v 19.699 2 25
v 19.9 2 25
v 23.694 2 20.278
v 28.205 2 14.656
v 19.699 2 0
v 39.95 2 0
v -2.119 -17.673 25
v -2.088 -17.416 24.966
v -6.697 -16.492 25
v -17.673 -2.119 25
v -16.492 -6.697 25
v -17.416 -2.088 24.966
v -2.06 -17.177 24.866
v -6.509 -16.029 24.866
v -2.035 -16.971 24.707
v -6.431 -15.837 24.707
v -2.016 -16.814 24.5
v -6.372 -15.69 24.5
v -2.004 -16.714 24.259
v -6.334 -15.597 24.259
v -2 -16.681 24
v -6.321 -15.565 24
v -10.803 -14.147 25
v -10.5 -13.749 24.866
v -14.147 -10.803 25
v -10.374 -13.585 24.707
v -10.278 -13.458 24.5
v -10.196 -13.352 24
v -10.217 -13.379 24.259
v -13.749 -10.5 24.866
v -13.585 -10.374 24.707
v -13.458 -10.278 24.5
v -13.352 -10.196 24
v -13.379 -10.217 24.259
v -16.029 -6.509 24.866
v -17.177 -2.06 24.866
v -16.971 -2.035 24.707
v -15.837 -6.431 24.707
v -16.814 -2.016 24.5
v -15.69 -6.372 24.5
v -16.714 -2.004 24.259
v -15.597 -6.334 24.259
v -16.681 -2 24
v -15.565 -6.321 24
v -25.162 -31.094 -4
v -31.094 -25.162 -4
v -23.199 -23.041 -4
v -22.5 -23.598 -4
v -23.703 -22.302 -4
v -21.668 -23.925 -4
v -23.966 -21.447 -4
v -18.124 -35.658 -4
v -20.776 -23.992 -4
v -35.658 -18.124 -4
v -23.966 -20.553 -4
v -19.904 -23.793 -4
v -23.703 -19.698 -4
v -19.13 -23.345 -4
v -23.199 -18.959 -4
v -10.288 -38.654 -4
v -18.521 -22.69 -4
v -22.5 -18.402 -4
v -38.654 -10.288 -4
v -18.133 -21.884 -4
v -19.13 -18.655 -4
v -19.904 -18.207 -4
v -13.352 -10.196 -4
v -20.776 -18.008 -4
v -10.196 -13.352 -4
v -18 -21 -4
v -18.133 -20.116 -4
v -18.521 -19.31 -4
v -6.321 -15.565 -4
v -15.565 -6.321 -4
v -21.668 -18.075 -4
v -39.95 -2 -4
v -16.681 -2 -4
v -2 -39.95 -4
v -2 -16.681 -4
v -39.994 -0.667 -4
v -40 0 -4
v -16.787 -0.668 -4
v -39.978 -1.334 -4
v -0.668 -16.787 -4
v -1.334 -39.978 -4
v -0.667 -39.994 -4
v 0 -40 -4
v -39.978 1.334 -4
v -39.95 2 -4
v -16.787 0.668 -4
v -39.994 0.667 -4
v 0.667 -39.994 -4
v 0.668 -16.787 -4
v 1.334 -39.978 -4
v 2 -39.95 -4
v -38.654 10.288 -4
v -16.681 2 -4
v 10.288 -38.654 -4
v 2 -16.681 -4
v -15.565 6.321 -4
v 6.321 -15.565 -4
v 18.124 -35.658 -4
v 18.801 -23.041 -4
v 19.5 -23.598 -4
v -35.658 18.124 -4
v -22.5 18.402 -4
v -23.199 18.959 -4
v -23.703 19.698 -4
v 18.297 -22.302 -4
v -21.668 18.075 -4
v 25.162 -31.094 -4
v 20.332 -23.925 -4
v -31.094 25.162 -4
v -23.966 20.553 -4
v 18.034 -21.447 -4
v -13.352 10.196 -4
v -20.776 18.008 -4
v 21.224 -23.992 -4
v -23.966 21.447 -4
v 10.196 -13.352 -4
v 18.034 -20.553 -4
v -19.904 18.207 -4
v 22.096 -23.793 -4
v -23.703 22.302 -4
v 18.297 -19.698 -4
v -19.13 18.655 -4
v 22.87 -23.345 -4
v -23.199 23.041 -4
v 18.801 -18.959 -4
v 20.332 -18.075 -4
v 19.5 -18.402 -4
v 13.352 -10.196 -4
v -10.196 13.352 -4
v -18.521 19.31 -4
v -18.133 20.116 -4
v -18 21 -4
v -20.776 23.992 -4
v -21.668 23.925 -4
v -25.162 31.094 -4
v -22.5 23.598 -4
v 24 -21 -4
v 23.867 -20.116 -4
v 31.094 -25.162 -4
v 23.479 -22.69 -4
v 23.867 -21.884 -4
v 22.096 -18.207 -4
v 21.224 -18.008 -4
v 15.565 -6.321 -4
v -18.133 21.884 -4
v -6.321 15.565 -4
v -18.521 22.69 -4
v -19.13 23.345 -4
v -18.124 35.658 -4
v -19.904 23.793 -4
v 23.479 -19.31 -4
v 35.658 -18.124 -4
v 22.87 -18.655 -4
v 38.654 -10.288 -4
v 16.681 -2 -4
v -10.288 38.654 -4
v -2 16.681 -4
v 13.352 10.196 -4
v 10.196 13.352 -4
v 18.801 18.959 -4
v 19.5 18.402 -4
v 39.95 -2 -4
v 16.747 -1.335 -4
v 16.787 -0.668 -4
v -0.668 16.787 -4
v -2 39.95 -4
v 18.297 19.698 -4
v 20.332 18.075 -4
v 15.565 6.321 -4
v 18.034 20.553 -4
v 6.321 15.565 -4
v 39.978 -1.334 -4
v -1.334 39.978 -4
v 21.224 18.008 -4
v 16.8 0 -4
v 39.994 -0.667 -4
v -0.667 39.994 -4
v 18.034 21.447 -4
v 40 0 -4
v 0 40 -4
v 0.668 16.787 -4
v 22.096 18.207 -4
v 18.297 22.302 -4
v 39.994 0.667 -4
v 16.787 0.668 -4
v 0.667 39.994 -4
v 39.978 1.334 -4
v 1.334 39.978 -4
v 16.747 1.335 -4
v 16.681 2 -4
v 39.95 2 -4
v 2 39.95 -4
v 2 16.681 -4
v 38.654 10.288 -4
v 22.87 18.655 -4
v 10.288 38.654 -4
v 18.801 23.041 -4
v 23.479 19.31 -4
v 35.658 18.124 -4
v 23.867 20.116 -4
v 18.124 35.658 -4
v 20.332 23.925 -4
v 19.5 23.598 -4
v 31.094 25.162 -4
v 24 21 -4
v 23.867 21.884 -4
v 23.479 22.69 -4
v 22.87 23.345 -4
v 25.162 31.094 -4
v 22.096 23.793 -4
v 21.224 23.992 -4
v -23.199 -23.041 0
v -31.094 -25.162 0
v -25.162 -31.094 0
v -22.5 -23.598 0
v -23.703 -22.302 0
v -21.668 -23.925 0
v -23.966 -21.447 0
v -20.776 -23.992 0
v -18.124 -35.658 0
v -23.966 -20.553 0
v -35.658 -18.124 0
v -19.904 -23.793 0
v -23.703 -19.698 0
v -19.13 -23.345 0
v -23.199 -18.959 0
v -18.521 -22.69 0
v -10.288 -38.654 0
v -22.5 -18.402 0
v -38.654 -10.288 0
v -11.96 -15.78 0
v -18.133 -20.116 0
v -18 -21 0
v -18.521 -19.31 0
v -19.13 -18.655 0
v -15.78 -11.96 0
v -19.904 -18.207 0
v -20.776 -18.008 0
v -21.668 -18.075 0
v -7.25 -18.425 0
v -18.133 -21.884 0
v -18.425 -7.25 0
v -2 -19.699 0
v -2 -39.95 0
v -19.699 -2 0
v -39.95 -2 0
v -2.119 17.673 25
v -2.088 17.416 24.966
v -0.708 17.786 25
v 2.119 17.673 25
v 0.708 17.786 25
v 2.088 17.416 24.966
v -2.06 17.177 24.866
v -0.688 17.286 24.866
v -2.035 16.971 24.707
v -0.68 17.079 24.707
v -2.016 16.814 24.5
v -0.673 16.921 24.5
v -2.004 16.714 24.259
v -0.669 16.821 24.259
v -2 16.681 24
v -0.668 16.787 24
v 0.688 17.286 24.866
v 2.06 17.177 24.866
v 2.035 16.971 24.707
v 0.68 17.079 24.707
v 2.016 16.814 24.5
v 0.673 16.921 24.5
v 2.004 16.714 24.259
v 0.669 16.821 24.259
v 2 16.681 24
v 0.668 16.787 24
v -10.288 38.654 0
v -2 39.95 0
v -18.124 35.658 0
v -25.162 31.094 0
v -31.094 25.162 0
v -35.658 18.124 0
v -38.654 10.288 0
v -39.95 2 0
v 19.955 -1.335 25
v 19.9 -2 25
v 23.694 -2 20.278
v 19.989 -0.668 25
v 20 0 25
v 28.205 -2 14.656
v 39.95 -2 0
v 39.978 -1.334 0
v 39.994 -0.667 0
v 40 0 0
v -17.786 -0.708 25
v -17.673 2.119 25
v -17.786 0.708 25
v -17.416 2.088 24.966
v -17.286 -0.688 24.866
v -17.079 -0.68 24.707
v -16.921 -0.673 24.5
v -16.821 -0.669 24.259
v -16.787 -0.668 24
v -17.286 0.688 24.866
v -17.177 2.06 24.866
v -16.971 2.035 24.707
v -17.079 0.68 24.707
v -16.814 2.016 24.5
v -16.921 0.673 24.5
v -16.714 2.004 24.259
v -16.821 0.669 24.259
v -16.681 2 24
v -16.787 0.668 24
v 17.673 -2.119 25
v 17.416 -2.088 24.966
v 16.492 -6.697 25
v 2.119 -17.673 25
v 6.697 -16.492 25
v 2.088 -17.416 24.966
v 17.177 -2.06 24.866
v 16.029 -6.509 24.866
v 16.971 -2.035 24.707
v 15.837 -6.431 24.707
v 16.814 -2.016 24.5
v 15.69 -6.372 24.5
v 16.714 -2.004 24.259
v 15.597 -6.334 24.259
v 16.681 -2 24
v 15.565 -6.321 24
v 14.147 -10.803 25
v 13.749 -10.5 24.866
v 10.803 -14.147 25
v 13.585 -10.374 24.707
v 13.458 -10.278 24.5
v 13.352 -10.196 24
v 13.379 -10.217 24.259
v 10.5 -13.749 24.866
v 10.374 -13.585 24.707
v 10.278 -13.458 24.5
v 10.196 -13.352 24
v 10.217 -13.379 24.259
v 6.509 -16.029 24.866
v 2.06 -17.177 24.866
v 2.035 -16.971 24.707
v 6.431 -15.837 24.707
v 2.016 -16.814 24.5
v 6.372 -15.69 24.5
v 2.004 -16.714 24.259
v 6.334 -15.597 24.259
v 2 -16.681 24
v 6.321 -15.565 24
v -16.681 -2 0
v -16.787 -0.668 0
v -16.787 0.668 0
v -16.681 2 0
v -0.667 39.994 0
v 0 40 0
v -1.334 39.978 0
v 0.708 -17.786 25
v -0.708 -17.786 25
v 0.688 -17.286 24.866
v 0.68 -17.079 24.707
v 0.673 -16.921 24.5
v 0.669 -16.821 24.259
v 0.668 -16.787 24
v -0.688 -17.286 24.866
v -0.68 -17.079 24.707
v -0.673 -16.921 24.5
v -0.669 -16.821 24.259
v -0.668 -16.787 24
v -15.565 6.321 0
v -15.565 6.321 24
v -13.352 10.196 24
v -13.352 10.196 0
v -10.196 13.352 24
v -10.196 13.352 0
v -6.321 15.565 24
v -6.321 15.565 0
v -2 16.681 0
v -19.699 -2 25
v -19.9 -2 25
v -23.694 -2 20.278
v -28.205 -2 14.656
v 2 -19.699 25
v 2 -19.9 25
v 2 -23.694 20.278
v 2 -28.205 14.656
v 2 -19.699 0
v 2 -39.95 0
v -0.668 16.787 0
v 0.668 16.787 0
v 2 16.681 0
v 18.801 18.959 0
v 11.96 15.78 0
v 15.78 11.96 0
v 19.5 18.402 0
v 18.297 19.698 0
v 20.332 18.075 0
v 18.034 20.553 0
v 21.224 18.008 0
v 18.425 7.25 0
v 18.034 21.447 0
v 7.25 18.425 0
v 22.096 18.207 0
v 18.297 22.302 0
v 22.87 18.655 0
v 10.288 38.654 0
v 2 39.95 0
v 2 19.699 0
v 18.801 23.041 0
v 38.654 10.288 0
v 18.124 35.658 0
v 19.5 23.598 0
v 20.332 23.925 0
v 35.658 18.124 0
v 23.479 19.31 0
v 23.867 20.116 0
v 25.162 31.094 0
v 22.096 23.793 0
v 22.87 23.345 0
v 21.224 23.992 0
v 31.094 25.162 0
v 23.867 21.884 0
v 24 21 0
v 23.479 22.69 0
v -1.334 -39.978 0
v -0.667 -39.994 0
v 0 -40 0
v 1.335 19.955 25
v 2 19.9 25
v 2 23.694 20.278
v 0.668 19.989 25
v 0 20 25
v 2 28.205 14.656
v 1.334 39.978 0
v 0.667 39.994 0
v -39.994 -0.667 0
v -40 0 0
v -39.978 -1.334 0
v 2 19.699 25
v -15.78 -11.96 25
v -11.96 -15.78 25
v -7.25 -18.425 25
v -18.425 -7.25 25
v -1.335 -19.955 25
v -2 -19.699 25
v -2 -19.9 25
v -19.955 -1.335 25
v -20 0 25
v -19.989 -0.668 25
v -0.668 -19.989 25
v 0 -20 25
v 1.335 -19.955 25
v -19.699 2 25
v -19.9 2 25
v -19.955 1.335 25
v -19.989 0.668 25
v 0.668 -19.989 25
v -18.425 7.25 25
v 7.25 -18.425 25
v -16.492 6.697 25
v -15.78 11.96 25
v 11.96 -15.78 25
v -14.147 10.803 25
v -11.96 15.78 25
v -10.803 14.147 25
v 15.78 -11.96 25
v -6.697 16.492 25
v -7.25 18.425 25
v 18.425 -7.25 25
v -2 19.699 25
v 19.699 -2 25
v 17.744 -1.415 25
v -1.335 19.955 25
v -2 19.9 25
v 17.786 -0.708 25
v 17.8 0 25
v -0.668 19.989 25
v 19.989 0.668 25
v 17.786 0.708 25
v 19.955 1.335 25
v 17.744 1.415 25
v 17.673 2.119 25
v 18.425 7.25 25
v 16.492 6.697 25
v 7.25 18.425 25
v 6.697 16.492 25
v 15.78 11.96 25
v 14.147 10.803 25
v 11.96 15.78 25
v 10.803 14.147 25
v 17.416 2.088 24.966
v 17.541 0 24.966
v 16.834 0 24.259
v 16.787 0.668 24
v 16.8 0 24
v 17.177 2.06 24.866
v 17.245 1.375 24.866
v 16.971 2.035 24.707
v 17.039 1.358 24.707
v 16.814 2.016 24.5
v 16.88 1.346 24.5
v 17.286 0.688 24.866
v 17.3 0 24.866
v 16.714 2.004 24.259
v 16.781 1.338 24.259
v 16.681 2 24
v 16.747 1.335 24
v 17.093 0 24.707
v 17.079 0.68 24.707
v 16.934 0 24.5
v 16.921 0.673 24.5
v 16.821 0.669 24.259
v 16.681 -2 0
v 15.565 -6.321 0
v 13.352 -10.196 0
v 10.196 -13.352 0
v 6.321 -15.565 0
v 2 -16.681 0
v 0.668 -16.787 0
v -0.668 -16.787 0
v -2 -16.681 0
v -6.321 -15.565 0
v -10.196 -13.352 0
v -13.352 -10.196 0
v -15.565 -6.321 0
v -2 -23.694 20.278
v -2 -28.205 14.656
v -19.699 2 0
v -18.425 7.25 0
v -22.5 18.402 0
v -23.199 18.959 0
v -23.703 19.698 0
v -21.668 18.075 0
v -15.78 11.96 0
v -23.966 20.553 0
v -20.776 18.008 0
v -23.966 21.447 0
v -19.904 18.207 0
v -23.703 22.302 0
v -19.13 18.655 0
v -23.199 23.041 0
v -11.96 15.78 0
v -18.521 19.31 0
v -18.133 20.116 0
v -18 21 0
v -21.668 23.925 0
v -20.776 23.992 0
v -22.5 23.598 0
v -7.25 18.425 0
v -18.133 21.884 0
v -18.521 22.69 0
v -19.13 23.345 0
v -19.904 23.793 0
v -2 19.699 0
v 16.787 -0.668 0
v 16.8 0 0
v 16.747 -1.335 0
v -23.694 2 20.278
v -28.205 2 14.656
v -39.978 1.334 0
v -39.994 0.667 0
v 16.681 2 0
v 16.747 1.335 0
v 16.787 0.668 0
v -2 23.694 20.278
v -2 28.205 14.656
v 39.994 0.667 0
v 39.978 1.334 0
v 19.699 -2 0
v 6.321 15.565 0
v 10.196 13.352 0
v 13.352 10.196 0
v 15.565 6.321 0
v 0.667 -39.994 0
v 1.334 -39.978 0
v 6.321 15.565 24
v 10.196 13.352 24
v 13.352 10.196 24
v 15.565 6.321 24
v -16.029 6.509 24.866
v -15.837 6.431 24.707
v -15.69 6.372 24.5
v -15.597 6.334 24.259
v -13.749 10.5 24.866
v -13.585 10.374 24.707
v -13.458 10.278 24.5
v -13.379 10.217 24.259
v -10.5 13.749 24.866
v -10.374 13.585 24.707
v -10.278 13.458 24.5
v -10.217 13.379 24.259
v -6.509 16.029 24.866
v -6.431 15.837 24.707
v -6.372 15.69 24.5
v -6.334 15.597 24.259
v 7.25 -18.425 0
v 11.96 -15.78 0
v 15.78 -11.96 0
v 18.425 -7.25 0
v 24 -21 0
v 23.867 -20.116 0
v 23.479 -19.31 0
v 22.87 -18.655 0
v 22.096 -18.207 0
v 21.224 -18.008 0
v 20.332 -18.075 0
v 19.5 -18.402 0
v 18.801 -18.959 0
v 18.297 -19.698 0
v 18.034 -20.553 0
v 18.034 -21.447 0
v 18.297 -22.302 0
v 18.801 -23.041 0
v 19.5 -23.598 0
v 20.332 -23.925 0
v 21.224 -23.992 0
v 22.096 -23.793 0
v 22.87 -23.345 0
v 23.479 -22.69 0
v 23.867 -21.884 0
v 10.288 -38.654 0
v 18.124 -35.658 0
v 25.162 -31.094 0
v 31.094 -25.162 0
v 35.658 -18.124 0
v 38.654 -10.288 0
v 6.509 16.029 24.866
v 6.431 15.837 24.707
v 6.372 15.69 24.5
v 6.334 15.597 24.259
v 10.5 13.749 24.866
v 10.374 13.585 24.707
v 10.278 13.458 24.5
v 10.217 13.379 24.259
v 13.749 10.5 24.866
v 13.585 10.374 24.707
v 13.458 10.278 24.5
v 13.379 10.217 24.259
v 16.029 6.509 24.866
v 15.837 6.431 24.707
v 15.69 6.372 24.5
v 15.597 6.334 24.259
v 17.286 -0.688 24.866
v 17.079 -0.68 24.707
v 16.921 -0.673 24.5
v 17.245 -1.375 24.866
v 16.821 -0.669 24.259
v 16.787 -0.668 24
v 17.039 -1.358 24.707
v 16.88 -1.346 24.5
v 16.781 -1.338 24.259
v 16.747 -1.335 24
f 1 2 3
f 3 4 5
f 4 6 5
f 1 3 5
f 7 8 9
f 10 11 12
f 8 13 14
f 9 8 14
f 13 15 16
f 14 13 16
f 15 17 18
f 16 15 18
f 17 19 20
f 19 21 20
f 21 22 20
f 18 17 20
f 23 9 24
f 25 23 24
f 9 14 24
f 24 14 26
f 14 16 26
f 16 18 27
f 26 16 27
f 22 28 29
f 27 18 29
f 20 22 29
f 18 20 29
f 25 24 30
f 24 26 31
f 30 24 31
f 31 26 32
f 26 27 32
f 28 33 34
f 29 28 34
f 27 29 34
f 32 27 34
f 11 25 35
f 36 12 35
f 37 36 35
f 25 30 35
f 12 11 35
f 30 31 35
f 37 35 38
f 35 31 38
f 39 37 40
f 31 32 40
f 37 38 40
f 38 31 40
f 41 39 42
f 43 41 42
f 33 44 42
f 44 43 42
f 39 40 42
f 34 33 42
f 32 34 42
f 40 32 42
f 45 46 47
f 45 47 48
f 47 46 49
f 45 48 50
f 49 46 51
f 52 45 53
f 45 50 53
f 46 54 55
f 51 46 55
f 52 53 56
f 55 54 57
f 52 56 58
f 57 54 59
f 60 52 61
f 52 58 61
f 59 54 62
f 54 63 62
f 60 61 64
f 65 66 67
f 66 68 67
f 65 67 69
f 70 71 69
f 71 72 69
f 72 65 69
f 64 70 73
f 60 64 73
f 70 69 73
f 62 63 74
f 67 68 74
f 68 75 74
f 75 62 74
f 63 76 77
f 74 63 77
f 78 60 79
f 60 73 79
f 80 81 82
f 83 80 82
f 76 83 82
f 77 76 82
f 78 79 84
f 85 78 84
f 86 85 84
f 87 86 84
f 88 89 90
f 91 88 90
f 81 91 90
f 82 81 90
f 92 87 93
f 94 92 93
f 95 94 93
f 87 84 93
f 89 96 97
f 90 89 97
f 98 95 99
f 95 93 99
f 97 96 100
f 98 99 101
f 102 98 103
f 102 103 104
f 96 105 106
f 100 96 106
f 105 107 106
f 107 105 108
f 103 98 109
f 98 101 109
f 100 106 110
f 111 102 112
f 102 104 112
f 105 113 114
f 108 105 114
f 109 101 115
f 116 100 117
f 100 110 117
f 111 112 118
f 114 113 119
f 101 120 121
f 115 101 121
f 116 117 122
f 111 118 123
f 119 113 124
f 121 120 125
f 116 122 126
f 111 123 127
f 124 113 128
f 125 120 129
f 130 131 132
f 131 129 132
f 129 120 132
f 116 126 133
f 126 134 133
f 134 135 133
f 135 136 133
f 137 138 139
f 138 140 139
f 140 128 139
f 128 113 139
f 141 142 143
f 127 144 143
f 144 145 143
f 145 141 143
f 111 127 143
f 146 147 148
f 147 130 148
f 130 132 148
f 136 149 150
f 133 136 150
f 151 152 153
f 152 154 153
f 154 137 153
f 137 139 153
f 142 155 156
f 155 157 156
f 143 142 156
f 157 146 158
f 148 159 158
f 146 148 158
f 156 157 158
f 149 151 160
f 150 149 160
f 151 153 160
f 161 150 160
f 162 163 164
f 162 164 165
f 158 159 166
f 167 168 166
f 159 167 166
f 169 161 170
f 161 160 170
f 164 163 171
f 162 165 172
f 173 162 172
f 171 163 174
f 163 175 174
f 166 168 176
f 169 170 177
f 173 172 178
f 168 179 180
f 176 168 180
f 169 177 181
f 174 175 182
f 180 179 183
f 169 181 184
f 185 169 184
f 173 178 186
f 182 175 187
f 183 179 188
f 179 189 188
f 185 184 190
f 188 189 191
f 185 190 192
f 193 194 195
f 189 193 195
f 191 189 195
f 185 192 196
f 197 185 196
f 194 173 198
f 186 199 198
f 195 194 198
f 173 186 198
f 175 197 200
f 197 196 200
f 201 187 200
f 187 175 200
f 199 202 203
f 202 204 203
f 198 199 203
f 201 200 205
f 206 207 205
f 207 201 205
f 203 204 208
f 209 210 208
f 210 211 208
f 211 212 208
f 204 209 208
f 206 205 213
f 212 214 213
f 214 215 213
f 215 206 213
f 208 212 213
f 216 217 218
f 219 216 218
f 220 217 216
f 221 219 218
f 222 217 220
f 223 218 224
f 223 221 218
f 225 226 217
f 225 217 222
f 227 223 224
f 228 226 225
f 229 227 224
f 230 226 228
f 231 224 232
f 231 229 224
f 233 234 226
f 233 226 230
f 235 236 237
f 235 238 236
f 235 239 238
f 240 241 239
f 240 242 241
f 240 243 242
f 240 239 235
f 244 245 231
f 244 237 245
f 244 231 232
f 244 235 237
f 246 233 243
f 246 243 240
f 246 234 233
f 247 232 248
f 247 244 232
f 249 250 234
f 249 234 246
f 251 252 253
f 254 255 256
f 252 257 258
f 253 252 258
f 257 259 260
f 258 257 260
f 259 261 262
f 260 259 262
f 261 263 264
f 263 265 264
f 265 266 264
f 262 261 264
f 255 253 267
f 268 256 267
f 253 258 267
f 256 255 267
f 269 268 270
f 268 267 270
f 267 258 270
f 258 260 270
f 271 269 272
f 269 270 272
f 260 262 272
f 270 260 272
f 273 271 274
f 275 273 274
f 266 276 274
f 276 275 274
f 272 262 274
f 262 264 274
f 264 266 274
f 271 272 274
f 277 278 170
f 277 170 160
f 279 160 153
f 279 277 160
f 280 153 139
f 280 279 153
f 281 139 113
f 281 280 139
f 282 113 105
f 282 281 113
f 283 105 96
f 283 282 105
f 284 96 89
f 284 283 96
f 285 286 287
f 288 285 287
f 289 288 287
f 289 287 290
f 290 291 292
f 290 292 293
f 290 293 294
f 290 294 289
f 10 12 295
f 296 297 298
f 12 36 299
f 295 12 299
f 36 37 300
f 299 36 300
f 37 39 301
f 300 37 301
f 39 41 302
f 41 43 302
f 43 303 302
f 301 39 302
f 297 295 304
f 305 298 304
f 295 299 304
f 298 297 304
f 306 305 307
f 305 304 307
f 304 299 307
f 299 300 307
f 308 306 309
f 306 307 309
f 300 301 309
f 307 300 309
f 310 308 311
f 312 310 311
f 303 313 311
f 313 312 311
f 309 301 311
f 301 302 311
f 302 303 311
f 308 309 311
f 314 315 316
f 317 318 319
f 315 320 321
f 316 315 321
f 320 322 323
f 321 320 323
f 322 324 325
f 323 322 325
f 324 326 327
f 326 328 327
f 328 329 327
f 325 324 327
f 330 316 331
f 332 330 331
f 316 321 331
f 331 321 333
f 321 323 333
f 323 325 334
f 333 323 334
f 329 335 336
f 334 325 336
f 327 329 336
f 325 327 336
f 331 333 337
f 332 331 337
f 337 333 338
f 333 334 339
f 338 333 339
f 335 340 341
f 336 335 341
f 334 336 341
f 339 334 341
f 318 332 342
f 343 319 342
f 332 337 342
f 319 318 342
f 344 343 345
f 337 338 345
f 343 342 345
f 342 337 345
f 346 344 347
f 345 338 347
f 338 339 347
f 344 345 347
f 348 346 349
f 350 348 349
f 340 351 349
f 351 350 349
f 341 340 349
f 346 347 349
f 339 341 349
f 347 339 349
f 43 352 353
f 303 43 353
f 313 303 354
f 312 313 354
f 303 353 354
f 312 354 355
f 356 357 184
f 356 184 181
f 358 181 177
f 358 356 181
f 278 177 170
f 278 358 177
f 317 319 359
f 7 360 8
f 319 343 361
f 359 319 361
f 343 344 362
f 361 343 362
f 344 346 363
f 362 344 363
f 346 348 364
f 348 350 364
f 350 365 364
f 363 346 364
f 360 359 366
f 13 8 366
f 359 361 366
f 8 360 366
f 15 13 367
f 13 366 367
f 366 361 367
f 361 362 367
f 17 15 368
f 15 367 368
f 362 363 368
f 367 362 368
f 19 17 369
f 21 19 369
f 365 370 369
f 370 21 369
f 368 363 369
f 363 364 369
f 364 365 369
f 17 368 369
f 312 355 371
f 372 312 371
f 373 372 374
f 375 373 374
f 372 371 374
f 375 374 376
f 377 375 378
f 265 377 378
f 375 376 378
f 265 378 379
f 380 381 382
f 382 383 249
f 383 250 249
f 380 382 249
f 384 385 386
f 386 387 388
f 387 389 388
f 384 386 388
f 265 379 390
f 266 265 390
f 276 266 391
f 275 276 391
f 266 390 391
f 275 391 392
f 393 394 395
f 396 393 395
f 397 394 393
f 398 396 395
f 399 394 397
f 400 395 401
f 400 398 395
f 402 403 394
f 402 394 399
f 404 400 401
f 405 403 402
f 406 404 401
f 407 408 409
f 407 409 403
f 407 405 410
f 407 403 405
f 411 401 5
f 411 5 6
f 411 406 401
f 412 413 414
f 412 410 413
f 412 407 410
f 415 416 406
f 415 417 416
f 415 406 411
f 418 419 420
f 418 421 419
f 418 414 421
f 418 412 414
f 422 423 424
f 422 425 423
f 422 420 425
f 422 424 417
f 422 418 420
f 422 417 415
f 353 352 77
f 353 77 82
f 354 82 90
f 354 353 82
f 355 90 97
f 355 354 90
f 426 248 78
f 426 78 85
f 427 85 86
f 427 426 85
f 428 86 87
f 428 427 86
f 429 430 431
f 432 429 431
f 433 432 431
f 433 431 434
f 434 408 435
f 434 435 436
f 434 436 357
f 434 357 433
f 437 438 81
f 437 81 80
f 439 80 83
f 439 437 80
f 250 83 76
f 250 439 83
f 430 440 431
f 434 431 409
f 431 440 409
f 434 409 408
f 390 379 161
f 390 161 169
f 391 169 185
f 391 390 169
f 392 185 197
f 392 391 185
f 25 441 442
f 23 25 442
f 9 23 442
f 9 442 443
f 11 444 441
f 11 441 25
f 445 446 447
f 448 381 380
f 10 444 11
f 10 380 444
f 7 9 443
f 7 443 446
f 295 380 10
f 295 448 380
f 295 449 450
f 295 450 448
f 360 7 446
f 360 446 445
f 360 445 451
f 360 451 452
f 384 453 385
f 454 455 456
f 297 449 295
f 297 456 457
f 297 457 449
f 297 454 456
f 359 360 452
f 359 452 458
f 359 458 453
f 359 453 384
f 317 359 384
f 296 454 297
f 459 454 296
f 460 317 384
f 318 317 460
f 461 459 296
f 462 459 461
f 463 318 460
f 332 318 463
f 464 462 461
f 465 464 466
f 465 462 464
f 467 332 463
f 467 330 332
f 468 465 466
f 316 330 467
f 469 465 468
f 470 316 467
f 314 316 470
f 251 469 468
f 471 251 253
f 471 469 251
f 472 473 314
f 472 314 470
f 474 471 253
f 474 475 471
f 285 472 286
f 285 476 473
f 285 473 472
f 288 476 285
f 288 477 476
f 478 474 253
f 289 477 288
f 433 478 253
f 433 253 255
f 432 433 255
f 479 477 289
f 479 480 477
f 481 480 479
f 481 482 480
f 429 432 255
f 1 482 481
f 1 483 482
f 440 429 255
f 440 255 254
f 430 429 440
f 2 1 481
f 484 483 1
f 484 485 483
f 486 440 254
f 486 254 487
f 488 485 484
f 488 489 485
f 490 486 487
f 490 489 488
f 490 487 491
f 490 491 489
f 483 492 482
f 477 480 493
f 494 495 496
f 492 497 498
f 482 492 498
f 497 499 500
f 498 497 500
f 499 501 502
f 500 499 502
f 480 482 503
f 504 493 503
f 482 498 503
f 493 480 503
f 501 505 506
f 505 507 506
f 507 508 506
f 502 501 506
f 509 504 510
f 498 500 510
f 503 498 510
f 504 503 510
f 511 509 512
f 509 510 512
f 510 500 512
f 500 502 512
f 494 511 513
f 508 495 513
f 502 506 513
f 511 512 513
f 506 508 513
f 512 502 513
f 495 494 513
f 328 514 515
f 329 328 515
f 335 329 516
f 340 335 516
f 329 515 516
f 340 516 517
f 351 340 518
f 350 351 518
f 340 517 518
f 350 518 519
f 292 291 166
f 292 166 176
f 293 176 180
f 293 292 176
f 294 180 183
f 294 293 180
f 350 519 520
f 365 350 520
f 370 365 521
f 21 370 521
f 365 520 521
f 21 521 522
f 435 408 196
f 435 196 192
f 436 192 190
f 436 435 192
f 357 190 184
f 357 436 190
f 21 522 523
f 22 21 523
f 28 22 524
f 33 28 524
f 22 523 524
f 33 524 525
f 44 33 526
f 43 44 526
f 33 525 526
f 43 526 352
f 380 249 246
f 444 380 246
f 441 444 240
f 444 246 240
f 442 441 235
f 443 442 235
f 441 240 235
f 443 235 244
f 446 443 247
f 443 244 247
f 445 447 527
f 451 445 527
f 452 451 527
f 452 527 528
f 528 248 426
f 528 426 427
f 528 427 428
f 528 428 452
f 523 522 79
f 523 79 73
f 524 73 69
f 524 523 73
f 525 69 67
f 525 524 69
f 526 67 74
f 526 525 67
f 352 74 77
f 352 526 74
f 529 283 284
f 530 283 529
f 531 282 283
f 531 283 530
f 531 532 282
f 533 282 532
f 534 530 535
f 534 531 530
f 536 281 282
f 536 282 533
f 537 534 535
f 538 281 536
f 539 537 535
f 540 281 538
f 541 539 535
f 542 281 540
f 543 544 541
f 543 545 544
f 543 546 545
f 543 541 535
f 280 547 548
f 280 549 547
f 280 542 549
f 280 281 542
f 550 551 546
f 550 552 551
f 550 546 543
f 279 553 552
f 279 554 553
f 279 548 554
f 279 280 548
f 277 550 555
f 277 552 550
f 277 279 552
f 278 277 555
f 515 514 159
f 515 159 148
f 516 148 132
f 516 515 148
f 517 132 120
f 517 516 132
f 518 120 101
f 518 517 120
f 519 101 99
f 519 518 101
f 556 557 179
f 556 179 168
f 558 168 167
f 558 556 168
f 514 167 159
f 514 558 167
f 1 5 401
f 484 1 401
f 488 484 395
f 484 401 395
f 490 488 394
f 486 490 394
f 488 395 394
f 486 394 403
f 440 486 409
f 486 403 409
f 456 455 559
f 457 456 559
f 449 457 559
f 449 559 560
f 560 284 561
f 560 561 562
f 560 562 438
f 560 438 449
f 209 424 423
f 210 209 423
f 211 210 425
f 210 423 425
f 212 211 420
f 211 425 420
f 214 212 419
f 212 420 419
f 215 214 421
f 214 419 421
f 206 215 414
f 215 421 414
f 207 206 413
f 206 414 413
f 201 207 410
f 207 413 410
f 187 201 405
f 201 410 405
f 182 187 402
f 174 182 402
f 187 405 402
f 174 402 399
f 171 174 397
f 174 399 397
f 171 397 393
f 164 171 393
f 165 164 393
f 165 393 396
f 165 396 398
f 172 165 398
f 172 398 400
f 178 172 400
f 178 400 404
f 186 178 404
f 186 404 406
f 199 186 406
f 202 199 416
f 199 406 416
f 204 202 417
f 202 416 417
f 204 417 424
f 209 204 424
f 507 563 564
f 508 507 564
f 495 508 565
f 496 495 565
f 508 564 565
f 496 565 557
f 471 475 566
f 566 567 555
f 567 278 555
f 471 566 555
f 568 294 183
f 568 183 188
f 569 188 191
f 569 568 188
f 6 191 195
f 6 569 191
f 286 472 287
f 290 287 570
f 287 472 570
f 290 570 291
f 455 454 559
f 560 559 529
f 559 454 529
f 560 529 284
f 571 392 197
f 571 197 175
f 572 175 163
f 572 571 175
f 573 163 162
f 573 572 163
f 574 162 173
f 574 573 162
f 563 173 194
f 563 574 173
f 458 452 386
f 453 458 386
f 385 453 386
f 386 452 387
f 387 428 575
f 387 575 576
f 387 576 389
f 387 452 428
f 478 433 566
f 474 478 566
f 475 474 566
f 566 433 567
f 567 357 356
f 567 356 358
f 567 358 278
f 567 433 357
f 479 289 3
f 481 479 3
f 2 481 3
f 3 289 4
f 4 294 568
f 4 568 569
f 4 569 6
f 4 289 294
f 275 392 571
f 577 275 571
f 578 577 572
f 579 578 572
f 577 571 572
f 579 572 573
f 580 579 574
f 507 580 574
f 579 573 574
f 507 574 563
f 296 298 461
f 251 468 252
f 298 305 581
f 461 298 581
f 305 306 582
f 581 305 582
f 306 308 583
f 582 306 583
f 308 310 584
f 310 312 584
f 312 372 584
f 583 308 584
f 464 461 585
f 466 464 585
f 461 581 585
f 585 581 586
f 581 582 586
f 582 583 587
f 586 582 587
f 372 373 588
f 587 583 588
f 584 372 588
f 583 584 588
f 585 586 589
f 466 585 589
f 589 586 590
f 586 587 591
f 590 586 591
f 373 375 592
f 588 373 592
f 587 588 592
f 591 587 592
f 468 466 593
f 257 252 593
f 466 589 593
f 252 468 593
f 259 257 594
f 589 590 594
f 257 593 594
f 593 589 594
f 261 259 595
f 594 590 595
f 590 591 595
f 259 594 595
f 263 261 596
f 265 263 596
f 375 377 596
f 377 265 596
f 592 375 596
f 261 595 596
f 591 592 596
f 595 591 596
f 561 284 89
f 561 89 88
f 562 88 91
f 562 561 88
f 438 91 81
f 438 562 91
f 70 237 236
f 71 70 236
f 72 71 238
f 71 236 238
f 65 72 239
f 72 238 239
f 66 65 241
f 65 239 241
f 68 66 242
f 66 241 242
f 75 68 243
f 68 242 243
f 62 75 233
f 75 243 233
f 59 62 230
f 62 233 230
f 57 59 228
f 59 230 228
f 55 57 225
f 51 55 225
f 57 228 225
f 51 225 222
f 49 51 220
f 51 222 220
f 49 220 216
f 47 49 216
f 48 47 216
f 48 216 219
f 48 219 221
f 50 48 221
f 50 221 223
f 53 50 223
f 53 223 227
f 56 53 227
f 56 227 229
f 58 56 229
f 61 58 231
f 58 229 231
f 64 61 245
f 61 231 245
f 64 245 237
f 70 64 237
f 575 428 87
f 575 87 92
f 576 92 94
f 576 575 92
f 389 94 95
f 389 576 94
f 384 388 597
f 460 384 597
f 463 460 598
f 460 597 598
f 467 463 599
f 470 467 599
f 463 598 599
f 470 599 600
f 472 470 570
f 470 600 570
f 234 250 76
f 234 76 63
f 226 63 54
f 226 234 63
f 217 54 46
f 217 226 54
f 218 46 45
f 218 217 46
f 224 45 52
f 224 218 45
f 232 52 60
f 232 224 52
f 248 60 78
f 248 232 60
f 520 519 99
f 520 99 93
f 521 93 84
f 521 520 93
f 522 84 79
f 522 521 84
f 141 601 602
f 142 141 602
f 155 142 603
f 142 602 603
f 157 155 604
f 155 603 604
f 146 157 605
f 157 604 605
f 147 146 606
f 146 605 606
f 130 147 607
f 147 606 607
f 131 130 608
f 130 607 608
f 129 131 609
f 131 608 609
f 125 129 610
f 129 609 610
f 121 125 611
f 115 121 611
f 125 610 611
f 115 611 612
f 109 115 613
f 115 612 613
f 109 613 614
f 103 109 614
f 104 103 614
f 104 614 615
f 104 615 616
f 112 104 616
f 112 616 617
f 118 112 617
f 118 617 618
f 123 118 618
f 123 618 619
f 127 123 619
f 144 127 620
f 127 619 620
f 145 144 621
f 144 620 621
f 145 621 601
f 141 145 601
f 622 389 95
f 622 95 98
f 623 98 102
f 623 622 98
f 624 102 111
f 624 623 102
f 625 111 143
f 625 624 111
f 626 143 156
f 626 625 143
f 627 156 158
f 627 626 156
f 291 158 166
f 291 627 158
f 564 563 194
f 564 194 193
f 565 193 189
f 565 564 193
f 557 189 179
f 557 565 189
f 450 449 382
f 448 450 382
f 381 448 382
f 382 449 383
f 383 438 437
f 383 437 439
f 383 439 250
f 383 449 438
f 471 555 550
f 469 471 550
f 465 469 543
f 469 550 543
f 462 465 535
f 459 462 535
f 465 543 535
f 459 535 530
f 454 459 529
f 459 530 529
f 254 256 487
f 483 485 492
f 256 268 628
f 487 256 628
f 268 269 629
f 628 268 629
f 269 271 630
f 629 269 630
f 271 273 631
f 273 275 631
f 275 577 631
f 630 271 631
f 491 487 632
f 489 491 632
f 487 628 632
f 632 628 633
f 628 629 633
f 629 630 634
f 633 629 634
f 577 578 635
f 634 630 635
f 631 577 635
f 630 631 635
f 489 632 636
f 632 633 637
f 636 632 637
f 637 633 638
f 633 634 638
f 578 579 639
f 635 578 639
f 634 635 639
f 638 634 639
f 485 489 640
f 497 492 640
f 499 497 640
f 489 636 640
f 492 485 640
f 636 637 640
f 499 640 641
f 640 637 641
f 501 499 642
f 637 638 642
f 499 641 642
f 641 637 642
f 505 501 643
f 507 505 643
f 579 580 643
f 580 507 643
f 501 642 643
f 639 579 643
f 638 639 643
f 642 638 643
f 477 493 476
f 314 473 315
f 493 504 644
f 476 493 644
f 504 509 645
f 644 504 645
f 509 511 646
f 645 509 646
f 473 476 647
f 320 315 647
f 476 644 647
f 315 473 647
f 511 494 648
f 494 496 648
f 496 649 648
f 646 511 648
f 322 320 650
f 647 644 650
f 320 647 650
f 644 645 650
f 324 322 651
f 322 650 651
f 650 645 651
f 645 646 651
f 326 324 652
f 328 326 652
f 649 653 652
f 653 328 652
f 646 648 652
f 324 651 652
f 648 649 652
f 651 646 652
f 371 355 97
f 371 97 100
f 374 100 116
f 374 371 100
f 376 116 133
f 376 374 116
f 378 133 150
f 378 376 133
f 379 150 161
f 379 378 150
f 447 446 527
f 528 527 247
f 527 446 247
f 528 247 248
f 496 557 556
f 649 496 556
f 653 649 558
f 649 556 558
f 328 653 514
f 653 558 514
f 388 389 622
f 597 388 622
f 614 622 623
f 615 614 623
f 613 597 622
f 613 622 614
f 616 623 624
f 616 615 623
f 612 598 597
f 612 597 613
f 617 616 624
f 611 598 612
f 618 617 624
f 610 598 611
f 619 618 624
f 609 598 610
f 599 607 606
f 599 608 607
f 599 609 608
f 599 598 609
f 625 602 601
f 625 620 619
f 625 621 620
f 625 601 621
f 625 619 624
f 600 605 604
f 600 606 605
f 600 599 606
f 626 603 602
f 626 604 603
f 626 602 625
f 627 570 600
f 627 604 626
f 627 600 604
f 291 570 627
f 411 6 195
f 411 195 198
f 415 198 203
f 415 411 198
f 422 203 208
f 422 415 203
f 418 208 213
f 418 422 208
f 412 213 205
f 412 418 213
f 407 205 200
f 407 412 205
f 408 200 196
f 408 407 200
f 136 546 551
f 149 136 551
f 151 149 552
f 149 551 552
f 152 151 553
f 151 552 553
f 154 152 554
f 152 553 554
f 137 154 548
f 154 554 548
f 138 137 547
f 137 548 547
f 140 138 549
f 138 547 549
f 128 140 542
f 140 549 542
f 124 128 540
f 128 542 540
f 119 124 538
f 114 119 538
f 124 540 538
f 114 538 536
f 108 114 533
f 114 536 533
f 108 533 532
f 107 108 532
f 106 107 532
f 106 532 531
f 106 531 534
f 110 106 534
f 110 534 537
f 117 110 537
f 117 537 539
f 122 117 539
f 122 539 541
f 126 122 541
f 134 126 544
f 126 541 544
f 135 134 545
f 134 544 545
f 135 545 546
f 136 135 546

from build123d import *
from build123d import SkipClean  # not in build123d's __all__

# Parameters (mm, degrees)
F1_DEPTH = 25
F0_R     = 3
F2_DEPTH = 4
F3_SIZE2 = 24.99999
F3_SIZE  = 19.99999
F4_R     = 1


# Not quite as in the source:
# - a fillet or chamfer is up to 0.001 mm smaller than in the source, because OpenCascade refuses the exact size


with BuildPart() as f1:
    # F0 (on Top) → F1 (new body)
    with BuildSketch(Plane.XY):
        with BuildLine():
            ThreePointArc((2, 16.6805275696), (11.8793939239, 11.8793939239), (16.6805275696, 2))
            Line((16.6805275696, 2), (19.6987309236, 2))
            ThreePointArc((19.6987309236, 2), (14.0007142675, 14.0007142675), (2, 19.6987309236))
            Line((2, 19.6987309236), (2, 16.6805275696))
        make_face()
        with BuildLine():
            ThreePointArc((-2, 16.6805275696), (0, 16.8), (2, 16.6805275696))
            Line((2, 16.6805275696), (2, 19.6987309236))
            ThreePointArc((2, 19.6987309236), (0, 19.8), (-2, 19.6987309236))
            Line((-2, 19.6987309236), (-2, 16.6805275696))
        make_face()
        with BuildLine():
            ThreePointArc((-16.6805275696, 2), (-11.8793939239, 11.8793939239), (-2, 16.6805275696))
            Line((-2, 16.6805275696), (-2, 19.6987309236))
            ThreePointArc((-2, 19.6987309236), (-14.0007142675, 14.0007142675), (-19.6987309236, 2))
            Line((-19.6987309236, 2), (-16.6805275696, 2))
        make_face()
        with BuildLine():
            ThreePointArc((-16.6805275696, -2), (-16.8, 0), (-16.6805275696, 2))
            Line((-16.6805275696, 2), (-19.6987309236, 2))
            ThreePointArc((-19.6987309236, 2), (-19.8, 0), (-19.6987309236, -2))
            Line((-19.6987309236, -2), (-16.6805275696, -2))
        make_face()
        with BuildLine():
            Line((-2, -19.6987309236), (-2, -16.6805275696))
            ThreePointArc((-2, -16.6805275696), (-11.8793939239, -11.8793939239), (-16.6805275696, -2))
            Line((-16.6805275696, -2), (-19.6987309236, -2))
            ThreePointArc((-19.6987309236, -2), (-14.0007142675, -14.0007142675), (-2, -19.6987309236))
        make_face()
        with BuildLine():
            Line((2, -19.6987309236), (2, -16.6805275696))
            ThreePointArc((2, -16.6805275696), (0, -16.8), (-2, -16.6805275696))
            Line((-2, -16.6805275696), (-2, -19.6987309236))
            ThreePointArc((-2, -19.6987309236), (0, -19.8), (2, -19.6987309236))
        make_face()
        with BuildLine():
            Line((19.6987309236, -2), (16.6805275696, -2))
            ThreePointArc((16.6805275696, -2), (11.8793939239, -11.8793939239), (2, -16.6805275696))
            Line((2, -16.6805275696), (2, -19.6987309236))
            ThreePointArc((2, -19.6987309236), (14.0007142675, -14.0007142675), (19.6987309236, -2))
        make_face()
        with BuildLine():
            ThreePointArc((16.6805275696, 2), (16.7701052944, 1.0017826188), (16.8, 0))
            ThreePointArc((16.8, 0), (16.7701052944, -1.0017826188), (16.6805275696, -2))
            Line((16.6805275696, -2), (19.6987309236, -2))
            ThreePointArc((19.6987309236, -2), (19.7746665242, -1.0012811076), (19.8, 0))
            ThreePointArc((19.8, 0), (19.7746665242, 1.0012811076), (19.6987309236, 2))
            Line((19.6987309236, 2), (16.6805275696, 2))
        make_face()
        with BuildLine():
            ThreePointArc((-19.6987309236, -2), (-19.8, 0), (-19.6987309236, 2))
            Line((-19.6987309236, 2), (-39.9499687109, 2))
            ThreePointArc((-39.9499687109, 2), (-39.9874902215, 1.0003128423), (-40, 0))
            ThreePointArc((-40, 0), (-39.9874902215, -1.0003128423), (-39.9499687109, -2))
            Line((-39.9499687109, -2), (-19.6987309236, -2))
        make_face()
        with BuildLine():
            Line((2, -39.9499687109), (2, -19.6987309236))
            ThreePointArc((2, -19.6987309236), (0, -19.8), (-2, -19.6987309236))
            Line((-2, -19.6987309236), (-2, -39.9499687109))
            ThreePointArc((-2, -39.9499687109), (-1.0003128423, -39.9874902215), (0, -40))
            ThreePointArc((0, -40), (1.0003128423, -39.9874902215), (2, -39.9499687109))
        make_face()
        with BuildLine():
            Line((39.9499687109, 2), (19.6987309236, 2))
            ThreePointArc((19.6987309236, 2), (19.7746665242, 1.0012811076), (19.8, 0))
            ThreePointArc((19.8, 0), (19.7746665242, -1.0012811076), (19.6987309236, -2))
            Line((19.6987309236, -2), (39.9499687109, -2))
            ThreePointArc((39.9499687109, -2), (39.9874902215, -1.0003128423), (40, 0))
            ThreePointArc((40, 0), (39.9874902215, 1.0003128423), (39.9499687109, 2))
        make_face()
        with BuildLine():
            ThreePointArc((-2, 19.6987309236), (0, 19.8), (2, 19.6987309236))
            Line((2, 19.6987309236), (2, 39.9499687109))
            ThreePointArc((2, 39.9499687109), (1.0003128423, 39.9874902215), (0, 40))
            ThreePointArc((0, 40), (-1.0003128423, 39.9874902215), (-2, 39.9499687109))
            Line((-2, 39.9499687109), (-2, 19.6987309236))
        make_face()
    extrude(amount=F1_DEPTH)

    # F0 (on Top) → F2 (join)
    with BuildSketch(Plane.XY):
        with BuildLine():
            ThreePointArc((-19.6987309236, 2), (-14.0007142675, 14.0007142675), (-2, 19.6987309236))
            Line((-2, 19.6987309236), (-2, 39.9499687109))
            ThreePointArc((-2, 39.9499687109), (-28.2842712475, 28.2842712475), (-39.9499687109, 2))
            Line((-39.9499687109, 2), (-19.6987309236, 2))
        make_face()
        with Locations((-21, 21)):
            Circle(F0_R, mode=Mode.SUBTRACT)
        with BuildLine():
            ThreePointArc((2, 19.6987309236), (14.0007142675, 14.0007142675), (19.6987309236, 2))
            Line((19.6987309236, 2), (39.9499687109, 2))
            ThreePointArc((39.9499687109, 2), (28.2842712475, 28.2842712475), (2, 39.9499687109))
            Line((2, 39.9499687109), (2, 19.6987309236))
        make_face()
        with Locations((21, 21)):
            Circle(F0_R, mode=Mode.SUBTRACT)
        with BuildLine():
            Line((39.9499687109, 2), (19.6987309236, 2))
            ThreePointArc((19.6987309236, 2), (19.7746665242, 1.0012811076), (19.8, 0))
            ThreePointArc((19.8, 0), (19.7746665242, -1.0012811076), (19.6987309236, -2))
            Line((19.6987309236, -2), (39.9499687109, -2))
            ThreePointArc((39.9499687109, -2), (39.9874902215, -1.0003128423), (40, 0))
            ThreePointArc((40, 0), (39.9874902215, 1.0003128423), (39.9499687109, 2))
        make_face()
        with BuildLine():
            ThreePointArc((-2, 19.6987309236), (0, 19.8), (2, 19.6987309236))
            Line((2, 19.6987309236), (2, 39.9499687109))
            ThreePointArc((2, 39.9499687109), (1.0003128423, 39.9874902215), (0, 40))
            ThreePointArc((0, 40), (-1.0003128423, 39.9874902215), (-2, 39.9499687109))
            Line((-2, 39.9499687109), (-2, 19.6987309236))
        make_face()
        with BuildLine():
            Line((39.9499687109, -2), (19.6987309236, -2))
            ThreePointArc((19.6987309236, -2), (14.0007142675, -14.0007142675), (2, -19.6987309236))
            Line((2, -19.6987309236), (2, -39.9499687109))
            ThreePointArc((2, -39.9499687109), (28.2842712475, -28.2842712475), (39.9499687109, -2))
        make_face()
        with Locations((21, -21)):
            Circle(F0_R, mode=Mode.SUBTRACT)
        with BuildLine():
            Line((19.6987309236, -2), (16.6805275696, -2))
            ThreePointArc((16.6805275696, -2), (11.8793939239, -11.8793939239), (2, -16.6805275696))
            Line((2, -16.6805275696), (2, -19.6987309236))
            ThreePointArc((2, -19.6987309236), (14.0007142675, -14.0007142675), (19.6987309236, -2))
        make_face()
        with BuildLine():
            ThreePointArc((16.6805275696, 2), (16.7701052944, 1.0017826188), (16.8, 0))
            ThreePointArc((16.8, 0), (16.7701052944, -1.0017826188), (16.6805275696, -2))
            Line((16.6805275696, -2), (19.6987309236, -2))
            ThreePointArc((19.6987309236, -2), (19.7746665242, -1.0012811076), (19.8, 0))
            ThreePointArc((19.8, 0), (19.7746665242, 1.0012811076), (19.6987309236, 2))
            Line((19.6987309236, 2), (16.6805275696, 2))
        make_face()
        with BuildLine():
            ThreePointArc((2, 16.6805275696), (11.8793939239, 11.8793939239), (16.6805275696, 2))
            Line((16.6805275696, 2), (19.6987309236, 2))
            ThreePointArc((19.6987309236, 2), (14.0007142675, 14.0007142675), (2, 19.6987309236))
            Line((2, 19.6987309236), (2, 16.6805275696))
        make_face()
        with BuildLine():
            Line((2, -19.6987309236), (2, -16.6805275696))
            ThreePointArc((2, -16.6805275696), (0, -16.8), (-2, -16.6805275696))
            Line((-2, -16.6805275696), (-2, -19.6987309236))
            ThreePointArc((-2, -19.6987309236), (0, -19.8), (2, -19.6987309236))
        make_face()
        with BuildLine():
            Line((2, -39.9499687109), (2, -19.6987309236))
            ThreePointArc((2, -19.6987309236), (0, -19.8), (-2, -19.6987309236))
            Line((-2, -19.6987309236), (-2, -39.9499687109))
            ThreePointArc((-2, -39.9499687109), (-1.0003128423, -39.9874902215), (0, -40))
            ThreePointArc((0, -40), (1.0003128423, -39.9874902215), (2, -39.9499687109))
        make_face()
        with BuildLine():
            Line((-2, -19.6987309236), (-2, -16.6805275696))
            ThreePointArc((-2, -16.6805275696), (-11.8793939239, -11.8793939239), (-16.6805275696, -2))
            Line((-16.6805275696, -2), (-19.6987309236, -2))
            ThreePointArc((-19.6987309236, -2), (-14.0007142675, -14.0007142675), (-2, -19.6987309236))
        make_face()
        with BuildLine():
            Line((-2, -39.9499687109), (-2, -19.6987309236))
            ThreePointArc((-2, -19.6987309236), (-14.0007142675, -14.0007142675), (-19.6987309236, -2))
            Line((-19.6987309236, -2), (-39.9499687109, -2))
            ThreePointArc((-39.9499687109, -2), (-28.2842712475, -28.2842712475), (-2, -39.9499687109))
        make_face()
        with Locations((-21, -21)):
            Circle(F0_R, mode=Mode.SUBTRACT)
        with BuildLine():
            ThreePointArc((-19.6987309236, -2), (-19.8, 0), (-19.6987309236, 2))
            Line((-19.6987309236, 2), (-39.9499687109, 2))
            ThreePointArc((-39.9499687109, 2), (-39.9874902215, 1.0003128423), (-40, 0))
            ThreePointArc((-40, 0), (-39.9874902215, -1.0003128423), (-39.9499687109, -2))
            Line((-39.9499687109, -2), (-19.6987309236, -2))
        make_face()
        with BuildLine():
            ThreePointArc((-16.6805275696, -2), (-16.8, 0), (-16.6805275696, 2))
            Line((-16.6805275696, 2), (-19.6987309236, 2))
            ThreePointArc((-19.6987309236, 2), (-19.8, 0), (-19.6987309236, -2))
            Line((-19.6987309236, -2), (-16.6805275696, -2))
        make_face()
        with BuildLine():
            ThreePointArc((-16.6805275696, 2), (-11.8793939239, 11.8793939239), (-2, 16.6805275696))
            Line((-2, 16.6805275696), (-2, 19.6987309236))
            ThreePointArc((-2, 19.6987309236), (-14.0007142675, 14.0007142675), (-19.6987309236, 2))
            Line((-19.6987309236, 2), (-16.6805275696, 2))
        make_face()
        with BuildLine():
            ThreePointArc((-2, 16.6805275696), (0, 16.8), (2, 16.6805275696))
            Line((2, 16.6805275696), (2, 19.6987309236))
            ThreePointArc((2, 19.6987309236), (0, 19.8), (-2, 19.6987309236))
            Line((-2, 19.6987309236), (-2, 16.6805275696))
        make_face()
    with SkipClean():  # cleaning this boolean's faces spoils the solid; the shape is the same uncleaned
        extrude(amount=-F2_DEPTH)

    # F3 (size 20 and 25 in the source; OpenCascade refuses exactly that, so slightly less here)
    f3_edges = [f1.edges().sort_by_distance(p)[0] for p in [
        (-40, 0, 25),
        (0, -40, 25),
        (40, 0, 25),
        (0, 40, 25),
    ]]
    f3_side = f1.faces().sort_by_distance((-29.82435, 0.868629, 25))[0]
    chamfer(f3_edges, length=F3_SIZE, length2=F3_SIZE2, reference=f3_side)

    # F4
    f4_edges = [f1.edges().sort_by_distance(p)[0] for p in [
        (-16.680528, -2, 25),
    ]]
    fillet(f4_edges, radius=F4_R)


solid = f1.part
